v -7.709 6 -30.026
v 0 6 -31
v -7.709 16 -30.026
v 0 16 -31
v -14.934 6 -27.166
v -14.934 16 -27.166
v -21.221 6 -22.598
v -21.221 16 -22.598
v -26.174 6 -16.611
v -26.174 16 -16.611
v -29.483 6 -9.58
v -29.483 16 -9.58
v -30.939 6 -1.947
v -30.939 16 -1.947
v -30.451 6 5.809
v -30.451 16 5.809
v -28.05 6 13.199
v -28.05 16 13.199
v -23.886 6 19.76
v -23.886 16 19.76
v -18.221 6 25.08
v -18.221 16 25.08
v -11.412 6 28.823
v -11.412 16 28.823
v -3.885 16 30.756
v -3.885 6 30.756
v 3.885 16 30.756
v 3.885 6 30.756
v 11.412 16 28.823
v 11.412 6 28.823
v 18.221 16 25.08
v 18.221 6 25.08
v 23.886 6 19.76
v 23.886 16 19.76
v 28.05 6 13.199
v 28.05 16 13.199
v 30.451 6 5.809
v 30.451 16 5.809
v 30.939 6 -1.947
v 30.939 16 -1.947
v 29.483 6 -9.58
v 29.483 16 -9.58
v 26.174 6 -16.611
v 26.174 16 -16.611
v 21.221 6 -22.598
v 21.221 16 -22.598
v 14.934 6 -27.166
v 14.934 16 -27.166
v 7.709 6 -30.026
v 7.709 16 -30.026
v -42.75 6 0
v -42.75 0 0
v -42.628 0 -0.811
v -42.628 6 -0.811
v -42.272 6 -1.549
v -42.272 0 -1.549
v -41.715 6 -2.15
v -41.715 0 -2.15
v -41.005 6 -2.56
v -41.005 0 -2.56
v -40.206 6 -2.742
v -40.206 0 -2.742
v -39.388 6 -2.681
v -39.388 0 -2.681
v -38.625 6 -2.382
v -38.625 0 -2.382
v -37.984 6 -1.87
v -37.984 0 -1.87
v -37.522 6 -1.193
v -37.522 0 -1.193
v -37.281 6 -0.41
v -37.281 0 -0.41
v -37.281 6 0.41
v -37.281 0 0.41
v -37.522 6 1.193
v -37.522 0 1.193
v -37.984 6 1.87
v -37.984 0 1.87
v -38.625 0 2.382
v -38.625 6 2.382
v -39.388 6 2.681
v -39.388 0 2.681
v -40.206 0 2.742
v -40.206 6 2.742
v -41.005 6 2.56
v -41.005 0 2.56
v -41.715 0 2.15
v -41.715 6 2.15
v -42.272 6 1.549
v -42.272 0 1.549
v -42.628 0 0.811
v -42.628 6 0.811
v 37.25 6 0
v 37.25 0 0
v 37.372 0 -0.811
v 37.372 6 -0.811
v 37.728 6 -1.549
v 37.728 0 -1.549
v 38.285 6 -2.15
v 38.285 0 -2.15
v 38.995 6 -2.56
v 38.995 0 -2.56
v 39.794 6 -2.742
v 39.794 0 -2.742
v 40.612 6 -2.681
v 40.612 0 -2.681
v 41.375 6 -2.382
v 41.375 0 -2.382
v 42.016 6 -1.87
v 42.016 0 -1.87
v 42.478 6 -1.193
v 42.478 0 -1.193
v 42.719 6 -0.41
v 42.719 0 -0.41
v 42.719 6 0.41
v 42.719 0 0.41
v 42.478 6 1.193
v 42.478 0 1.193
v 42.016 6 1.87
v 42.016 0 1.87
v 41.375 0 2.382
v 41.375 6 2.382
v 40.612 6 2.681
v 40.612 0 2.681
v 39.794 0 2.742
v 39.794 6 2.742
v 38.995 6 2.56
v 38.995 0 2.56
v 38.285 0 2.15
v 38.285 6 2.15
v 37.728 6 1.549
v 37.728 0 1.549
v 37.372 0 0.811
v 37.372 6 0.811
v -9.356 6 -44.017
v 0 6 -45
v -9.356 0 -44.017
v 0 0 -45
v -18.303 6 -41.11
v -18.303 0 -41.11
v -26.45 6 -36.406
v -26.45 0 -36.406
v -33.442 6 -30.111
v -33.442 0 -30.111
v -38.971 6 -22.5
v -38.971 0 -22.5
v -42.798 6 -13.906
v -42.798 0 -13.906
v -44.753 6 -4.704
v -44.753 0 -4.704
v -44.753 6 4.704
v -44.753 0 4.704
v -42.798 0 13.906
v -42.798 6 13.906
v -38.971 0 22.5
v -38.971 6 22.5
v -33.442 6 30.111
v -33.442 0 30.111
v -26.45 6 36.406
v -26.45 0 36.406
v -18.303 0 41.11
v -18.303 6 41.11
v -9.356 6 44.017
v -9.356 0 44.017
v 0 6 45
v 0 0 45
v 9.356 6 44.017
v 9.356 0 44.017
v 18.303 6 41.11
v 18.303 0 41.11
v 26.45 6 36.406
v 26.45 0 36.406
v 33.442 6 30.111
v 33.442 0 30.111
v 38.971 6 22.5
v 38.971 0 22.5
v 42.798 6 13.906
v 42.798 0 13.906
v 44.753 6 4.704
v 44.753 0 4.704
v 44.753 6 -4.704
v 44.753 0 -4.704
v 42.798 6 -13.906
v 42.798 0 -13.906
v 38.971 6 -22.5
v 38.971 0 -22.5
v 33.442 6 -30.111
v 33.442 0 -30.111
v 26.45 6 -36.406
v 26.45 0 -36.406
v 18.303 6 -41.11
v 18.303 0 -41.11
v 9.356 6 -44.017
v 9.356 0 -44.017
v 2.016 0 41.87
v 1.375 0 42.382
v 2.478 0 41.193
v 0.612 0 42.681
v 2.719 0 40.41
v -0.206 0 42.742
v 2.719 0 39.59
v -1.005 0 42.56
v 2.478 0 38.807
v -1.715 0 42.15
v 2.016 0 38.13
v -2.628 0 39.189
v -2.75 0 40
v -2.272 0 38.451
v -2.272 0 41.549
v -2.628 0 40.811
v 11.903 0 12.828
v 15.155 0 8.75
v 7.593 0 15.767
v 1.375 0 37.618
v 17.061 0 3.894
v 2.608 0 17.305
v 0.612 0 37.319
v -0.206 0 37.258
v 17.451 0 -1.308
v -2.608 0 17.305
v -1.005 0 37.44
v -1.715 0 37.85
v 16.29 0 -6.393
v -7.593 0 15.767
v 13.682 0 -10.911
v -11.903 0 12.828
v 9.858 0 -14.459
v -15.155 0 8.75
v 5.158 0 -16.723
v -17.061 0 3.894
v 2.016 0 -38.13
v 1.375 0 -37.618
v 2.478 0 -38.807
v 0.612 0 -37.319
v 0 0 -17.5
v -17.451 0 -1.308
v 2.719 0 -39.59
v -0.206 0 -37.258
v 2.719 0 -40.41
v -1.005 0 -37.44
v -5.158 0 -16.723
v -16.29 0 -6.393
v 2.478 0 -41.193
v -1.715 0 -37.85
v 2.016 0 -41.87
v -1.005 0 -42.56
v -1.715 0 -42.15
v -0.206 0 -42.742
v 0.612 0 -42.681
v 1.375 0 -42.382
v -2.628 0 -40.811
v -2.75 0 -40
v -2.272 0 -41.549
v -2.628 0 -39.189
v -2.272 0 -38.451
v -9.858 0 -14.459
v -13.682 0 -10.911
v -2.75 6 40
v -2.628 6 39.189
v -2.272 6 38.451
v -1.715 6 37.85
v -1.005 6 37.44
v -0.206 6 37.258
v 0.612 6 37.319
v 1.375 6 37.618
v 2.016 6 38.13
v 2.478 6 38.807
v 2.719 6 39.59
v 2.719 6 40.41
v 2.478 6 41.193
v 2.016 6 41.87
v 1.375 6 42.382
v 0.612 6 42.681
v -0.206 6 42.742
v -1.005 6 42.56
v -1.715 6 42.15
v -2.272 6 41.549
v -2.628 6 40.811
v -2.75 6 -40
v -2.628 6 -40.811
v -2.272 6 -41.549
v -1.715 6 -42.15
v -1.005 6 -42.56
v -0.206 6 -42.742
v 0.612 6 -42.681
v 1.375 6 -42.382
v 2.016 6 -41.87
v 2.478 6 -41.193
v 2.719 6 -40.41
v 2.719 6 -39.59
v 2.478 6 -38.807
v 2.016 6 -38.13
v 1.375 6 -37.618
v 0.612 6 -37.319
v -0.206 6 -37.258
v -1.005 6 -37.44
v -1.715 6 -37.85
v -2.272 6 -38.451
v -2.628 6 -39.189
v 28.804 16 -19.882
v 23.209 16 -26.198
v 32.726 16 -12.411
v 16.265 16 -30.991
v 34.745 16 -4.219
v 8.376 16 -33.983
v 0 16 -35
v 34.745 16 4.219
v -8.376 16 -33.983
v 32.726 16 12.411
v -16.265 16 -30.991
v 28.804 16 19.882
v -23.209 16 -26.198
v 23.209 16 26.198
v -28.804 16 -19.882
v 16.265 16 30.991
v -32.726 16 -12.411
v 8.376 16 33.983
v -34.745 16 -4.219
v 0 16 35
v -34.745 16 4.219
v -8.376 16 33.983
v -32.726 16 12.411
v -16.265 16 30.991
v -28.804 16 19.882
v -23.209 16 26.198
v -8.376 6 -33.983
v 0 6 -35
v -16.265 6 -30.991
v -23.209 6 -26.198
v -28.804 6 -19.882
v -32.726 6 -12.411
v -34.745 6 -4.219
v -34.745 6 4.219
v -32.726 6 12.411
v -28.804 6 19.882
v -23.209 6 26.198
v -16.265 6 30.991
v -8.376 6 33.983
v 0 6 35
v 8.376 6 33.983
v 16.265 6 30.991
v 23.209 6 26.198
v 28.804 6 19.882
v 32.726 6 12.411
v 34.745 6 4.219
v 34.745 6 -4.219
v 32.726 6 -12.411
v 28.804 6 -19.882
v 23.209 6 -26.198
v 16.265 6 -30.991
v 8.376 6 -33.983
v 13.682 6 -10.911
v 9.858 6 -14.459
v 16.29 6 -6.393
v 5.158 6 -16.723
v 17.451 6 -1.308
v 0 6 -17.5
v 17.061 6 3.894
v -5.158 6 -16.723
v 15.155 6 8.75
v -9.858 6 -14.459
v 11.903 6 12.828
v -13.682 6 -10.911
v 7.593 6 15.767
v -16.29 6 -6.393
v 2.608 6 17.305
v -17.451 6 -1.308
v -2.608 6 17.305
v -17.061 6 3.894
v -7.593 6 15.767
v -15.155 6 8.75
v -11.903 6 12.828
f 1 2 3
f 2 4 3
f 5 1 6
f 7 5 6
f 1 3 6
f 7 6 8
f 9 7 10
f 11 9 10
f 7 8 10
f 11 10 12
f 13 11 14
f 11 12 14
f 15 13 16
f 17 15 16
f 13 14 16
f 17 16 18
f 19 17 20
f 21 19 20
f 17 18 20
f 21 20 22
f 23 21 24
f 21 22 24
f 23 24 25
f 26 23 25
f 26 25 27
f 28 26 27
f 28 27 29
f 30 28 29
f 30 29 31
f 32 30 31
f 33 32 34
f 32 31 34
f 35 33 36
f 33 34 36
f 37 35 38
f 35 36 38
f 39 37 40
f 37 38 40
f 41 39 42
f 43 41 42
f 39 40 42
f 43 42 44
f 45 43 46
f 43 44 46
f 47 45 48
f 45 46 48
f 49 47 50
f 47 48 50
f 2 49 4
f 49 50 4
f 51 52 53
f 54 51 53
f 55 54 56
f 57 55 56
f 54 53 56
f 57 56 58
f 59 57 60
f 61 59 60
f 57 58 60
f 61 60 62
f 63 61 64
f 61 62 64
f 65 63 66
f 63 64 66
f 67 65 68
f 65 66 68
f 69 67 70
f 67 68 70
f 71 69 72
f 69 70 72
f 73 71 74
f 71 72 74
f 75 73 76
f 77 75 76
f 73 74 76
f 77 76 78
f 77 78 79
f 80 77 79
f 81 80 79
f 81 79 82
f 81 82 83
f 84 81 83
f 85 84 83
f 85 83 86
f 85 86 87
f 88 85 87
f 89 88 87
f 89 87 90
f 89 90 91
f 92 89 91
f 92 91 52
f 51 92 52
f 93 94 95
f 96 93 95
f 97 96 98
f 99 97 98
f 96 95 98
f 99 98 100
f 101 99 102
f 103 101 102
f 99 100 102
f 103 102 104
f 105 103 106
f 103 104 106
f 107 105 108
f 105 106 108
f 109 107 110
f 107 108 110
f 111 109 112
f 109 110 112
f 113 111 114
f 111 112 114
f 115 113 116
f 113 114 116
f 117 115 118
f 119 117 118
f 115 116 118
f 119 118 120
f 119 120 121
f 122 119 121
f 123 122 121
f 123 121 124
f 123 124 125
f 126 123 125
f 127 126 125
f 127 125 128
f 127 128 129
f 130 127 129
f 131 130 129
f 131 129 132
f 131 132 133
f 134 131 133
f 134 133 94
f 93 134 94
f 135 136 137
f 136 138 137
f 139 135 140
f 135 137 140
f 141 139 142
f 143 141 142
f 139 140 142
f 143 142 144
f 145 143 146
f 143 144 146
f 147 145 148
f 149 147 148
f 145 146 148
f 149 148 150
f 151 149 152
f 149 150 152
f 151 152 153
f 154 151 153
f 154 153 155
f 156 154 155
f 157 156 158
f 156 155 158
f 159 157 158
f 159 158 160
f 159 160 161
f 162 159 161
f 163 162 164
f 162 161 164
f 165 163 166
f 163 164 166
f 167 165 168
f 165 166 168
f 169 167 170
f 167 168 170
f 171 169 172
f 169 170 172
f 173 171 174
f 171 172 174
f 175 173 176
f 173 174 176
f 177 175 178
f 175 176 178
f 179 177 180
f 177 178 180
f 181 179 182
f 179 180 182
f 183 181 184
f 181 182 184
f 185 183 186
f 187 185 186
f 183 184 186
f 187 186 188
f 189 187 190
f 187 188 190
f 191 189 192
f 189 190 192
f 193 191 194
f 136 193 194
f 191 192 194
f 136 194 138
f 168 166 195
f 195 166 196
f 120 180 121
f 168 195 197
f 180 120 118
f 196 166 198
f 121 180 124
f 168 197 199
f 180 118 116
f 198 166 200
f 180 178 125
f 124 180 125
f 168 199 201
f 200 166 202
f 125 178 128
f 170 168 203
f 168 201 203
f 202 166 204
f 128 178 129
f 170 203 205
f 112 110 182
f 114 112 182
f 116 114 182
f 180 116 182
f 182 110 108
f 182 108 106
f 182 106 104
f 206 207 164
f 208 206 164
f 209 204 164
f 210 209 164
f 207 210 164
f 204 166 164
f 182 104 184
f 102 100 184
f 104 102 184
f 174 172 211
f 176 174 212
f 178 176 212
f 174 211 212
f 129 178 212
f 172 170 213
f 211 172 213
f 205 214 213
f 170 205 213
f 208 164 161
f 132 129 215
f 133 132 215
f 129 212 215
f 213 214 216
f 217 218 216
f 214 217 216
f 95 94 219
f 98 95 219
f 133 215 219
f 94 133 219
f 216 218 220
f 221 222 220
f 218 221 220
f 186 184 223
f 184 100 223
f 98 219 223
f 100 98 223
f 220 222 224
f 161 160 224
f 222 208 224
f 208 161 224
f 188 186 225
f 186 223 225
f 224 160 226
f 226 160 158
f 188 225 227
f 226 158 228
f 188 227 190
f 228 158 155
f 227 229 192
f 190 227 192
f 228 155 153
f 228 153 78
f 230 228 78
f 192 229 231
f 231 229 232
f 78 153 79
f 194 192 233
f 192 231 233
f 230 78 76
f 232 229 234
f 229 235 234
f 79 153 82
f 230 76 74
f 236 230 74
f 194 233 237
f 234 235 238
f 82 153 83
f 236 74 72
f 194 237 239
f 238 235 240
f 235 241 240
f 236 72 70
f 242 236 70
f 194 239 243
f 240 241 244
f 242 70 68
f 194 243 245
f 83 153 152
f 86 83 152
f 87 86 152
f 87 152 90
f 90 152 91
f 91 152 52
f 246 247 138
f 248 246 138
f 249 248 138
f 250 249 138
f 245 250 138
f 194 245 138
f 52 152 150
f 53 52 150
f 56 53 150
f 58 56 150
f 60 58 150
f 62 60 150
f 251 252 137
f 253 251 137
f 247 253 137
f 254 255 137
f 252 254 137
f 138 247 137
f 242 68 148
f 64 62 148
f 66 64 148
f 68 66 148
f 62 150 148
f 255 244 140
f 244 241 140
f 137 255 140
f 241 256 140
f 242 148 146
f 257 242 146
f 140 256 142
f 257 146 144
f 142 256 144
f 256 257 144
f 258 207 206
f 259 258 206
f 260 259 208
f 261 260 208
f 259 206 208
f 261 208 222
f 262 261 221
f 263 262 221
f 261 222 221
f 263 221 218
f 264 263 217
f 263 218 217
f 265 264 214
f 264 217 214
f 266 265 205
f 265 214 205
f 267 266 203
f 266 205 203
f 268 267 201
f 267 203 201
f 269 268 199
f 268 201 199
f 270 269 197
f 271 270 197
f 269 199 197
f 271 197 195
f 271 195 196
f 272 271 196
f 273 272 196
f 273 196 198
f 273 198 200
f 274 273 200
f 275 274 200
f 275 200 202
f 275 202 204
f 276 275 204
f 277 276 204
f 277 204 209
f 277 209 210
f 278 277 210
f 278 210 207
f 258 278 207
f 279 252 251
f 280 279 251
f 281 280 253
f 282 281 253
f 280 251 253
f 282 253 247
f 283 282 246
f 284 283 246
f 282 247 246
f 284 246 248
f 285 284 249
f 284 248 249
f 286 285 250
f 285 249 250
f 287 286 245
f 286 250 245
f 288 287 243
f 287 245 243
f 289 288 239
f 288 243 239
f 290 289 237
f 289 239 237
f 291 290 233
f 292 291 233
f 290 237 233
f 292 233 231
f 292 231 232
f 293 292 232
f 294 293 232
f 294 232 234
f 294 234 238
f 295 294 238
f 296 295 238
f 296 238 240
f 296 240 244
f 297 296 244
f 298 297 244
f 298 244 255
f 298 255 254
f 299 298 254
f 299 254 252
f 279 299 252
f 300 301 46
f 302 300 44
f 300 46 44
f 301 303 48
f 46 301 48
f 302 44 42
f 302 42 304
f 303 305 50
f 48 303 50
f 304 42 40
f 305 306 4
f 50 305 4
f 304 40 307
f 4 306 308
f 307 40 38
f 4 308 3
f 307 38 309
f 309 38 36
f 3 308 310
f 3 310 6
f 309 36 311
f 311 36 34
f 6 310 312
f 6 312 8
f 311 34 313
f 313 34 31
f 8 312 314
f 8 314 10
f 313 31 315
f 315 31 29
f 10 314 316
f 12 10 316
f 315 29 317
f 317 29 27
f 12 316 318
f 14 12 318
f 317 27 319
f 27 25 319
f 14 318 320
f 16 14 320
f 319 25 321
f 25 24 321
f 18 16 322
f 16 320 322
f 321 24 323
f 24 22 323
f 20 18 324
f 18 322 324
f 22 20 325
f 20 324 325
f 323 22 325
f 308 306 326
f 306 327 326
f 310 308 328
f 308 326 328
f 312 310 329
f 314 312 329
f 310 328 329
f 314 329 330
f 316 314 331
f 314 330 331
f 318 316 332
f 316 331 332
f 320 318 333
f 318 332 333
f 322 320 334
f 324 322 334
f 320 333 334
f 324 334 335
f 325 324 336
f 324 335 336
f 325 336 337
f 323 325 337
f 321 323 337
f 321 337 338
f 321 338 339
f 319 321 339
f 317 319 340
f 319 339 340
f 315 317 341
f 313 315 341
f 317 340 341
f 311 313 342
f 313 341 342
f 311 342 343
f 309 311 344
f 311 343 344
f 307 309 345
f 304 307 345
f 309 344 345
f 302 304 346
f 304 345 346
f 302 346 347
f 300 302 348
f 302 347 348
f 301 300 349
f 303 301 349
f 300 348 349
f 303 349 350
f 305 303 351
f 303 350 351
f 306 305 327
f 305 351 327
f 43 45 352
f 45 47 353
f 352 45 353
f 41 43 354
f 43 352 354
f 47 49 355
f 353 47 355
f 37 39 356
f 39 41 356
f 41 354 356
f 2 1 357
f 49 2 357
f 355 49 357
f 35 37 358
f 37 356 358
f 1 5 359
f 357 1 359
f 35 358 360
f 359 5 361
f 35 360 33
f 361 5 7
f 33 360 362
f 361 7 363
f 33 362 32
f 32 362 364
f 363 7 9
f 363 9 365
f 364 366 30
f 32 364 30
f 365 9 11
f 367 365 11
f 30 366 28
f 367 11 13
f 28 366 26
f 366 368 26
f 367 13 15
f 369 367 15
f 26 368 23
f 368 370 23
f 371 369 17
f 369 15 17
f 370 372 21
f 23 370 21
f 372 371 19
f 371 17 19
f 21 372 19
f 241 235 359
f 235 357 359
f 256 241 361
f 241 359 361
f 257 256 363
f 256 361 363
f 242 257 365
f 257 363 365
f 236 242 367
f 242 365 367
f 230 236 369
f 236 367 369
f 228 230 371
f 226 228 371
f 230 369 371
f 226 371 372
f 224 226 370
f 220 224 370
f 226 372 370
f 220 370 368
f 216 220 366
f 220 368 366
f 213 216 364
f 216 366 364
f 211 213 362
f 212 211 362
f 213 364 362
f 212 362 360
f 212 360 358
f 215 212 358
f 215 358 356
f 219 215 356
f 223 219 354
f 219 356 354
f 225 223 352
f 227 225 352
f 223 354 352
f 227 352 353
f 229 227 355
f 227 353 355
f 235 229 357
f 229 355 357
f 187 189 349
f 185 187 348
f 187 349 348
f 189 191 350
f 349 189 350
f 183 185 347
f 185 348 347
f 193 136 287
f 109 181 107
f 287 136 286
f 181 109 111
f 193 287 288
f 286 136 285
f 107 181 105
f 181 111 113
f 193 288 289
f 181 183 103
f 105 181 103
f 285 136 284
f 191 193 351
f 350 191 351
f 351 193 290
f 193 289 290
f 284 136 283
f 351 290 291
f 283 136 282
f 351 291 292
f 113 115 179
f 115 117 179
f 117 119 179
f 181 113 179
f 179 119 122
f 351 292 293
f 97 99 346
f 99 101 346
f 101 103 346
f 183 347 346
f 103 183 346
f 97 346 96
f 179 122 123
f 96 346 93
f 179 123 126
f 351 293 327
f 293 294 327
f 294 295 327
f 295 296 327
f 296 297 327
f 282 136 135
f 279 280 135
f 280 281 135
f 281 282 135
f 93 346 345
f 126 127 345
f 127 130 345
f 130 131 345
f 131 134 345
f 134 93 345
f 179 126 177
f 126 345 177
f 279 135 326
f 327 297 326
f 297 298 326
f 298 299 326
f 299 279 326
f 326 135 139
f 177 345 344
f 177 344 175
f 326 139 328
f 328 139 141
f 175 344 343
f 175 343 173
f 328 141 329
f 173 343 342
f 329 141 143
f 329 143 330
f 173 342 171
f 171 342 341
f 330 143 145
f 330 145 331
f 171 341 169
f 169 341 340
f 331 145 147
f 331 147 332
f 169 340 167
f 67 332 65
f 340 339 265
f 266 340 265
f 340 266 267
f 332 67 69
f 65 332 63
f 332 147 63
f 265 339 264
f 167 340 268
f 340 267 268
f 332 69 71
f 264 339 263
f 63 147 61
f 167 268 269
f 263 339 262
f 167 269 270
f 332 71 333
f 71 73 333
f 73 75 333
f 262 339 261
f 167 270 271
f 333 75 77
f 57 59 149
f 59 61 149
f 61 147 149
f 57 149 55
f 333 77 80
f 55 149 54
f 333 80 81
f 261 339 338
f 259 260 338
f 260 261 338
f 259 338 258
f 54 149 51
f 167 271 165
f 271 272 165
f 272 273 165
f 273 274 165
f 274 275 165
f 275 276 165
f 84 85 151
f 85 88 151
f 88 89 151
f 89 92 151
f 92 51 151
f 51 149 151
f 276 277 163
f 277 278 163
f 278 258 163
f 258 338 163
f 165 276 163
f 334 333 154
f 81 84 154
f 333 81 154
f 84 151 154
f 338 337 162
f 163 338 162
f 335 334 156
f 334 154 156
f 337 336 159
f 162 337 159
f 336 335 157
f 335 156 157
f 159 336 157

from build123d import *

# Parameters (mm, degrees)
FURO_COM_FOLGA_DE_M51_D = 5.5


with BuildPart() as part:
    # Esboço1 → Revolução1 (revolve)
    with BuildSketch(Plane.XY, mode=Mode.PRIVATE) as revolu_o1_sk:
        Polygon((17.5, 0), (17.5, 6), (31, 6), (31, 16), (35, 16), (35, 6), (45, 6), (45, 0), align=None)
    revolve(revolu_o1_sk.sketch.rotate(Axis((0, 0, 0), (0, 1, 0)), 90), axis=Axis((0, 0, 0), (0, 1, 0)))

    # Furo com folga de M51 (through all)
    with Locations(Plane(origin=(0, 6, 0), x_dir=(1, 0, 0), z_dir=(0, 1, 0))):
        with Locations((0, 40), (40, 0), (0, -40), (-40, 0)):
            Hole(FURO_COM_FOLGA_DE_M51_D / 2)


solid = part.part
